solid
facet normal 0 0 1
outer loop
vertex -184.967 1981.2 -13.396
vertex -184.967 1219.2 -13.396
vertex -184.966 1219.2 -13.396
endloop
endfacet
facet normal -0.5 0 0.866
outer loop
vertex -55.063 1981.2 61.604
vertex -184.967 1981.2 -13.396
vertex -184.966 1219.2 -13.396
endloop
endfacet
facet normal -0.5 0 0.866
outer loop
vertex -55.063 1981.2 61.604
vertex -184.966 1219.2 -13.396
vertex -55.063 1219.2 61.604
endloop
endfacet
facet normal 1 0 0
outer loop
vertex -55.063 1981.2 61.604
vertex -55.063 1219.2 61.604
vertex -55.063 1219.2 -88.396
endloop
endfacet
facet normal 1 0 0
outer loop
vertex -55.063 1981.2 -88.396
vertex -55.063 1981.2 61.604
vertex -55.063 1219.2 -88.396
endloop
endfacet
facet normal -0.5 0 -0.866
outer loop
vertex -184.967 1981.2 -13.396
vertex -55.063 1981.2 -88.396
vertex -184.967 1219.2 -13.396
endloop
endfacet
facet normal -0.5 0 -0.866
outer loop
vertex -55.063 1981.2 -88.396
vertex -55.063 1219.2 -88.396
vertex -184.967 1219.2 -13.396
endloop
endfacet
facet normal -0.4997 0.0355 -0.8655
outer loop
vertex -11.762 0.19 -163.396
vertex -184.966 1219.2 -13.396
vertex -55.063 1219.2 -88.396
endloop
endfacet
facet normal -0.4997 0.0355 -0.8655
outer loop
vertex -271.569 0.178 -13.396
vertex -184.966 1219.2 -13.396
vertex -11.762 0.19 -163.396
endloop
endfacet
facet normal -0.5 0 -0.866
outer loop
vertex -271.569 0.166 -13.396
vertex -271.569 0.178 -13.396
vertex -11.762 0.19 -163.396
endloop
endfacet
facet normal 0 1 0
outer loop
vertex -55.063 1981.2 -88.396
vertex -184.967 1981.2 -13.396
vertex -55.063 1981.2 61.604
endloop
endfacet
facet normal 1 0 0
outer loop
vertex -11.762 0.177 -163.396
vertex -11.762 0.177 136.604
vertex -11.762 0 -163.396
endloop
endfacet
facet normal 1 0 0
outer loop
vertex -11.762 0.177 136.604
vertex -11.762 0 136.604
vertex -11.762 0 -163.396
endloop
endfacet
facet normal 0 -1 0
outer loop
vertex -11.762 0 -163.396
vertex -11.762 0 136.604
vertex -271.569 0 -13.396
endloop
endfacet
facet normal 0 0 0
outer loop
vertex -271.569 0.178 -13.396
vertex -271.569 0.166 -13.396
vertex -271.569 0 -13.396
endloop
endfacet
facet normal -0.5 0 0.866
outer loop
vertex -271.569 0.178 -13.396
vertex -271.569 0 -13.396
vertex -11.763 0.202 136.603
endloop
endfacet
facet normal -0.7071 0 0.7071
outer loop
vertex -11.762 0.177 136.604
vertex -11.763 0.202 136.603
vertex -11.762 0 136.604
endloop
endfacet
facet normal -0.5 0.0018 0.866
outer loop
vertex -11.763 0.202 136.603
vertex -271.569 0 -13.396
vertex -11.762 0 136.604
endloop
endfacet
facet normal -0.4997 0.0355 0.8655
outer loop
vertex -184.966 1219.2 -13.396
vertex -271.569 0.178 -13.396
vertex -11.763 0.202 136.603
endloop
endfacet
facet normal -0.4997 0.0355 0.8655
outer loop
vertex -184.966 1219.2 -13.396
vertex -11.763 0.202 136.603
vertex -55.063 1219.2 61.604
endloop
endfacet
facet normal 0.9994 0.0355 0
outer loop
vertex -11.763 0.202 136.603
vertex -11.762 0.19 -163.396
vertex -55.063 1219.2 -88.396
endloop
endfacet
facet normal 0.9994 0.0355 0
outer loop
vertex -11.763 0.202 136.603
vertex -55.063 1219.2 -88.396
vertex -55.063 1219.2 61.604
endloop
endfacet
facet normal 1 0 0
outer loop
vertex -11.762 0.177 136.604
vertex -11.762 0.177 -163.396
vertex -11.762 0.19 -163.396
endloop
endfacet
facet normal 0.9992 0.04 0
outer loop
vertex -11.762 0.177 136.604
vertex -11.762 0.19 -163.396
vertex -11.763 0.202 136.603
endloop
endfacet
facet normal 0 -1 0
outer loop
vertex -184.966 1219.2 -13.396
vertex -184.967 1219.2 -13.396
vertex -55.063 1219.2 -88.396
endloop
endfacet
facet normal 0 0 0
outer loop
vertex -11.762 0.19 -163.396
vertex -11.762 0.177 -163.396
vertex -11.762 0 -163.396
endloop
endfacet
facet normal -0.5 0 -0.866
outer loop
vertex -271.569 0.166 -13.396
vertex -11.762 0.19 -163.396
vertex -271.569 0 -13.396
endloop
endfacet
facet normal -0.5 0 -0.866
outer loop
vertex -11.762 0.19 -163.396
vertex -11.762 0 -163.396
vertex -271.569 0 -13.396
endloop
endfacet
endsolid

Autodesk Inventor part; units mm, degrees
sketch "Sketch1" plane through (0, 0, 0) normal (0, 1, 0) x (-1, 0, 0)
  line L0 (11.7617, 136.6037) -> (11.7617, -163.3963)
  line L1 (11.7617, -163.3963) -> (271.5693, -13.3963)
  line L2 (271.5693, -13.3963) -> (11.7617, 136.6037)
  circle A0 centre (98.3643, -13.3963) radius 86.6025
  line L3 (55.063, 61.6037) -> (55.063, -88.3963)
  line L4 (55.063, 61.6037) -> (184.9668, -13.3963)
  line L5 (55.063, 61.6037) -> (205.063, 61.6037) construction
  line L6 (184.9668, -13.3963) -> (55.063, -88.3963)
  circle A1 centre (98.3643, -13.3963) radius 43.3013
  point P0 (85.0813, -150)
  point P1 (141.6655, 61.6037)
  point P2 (141.6655, -88.3963)
  point P3 (11.7617, -13.3963)
  point P4 (203.5969, -52.6402)
  dimension "d10" = 300
  dimension "d11" = 300
  dimension "d12" = 60
  dimension "d13" = 150
  dimension "d14" = 150
  dimension "d15" = 30
ref_plane "Work Plane1" through (-52.1275, 0, 74.1452) normal (0, -1, 0) x (0, 0, -1)
extrude "Extrusion2" add sketch "Sketch1" along normal blind 1219.2
sketch "Sketch2" plane through (0, 1219.2, 0) normal (0, 1, 0) x (1, 0, 0)
  line L0 (-271.5693, 13.3963) -> (-11.7617, -136.6037) projected
  line L1 (-11.7617, -136.6037) -> (-11.7617, 163.3963) projected
  line L2 (-11.7617, 163.3963) -> (-271.5693, 13.3963) projected
  circle A0 centre (-98.3643, 13.3963) radius 86.6025
  line L3 (-55.063, -61.6037) -> (-55.063, 88.3963)
  line L4 (-55.063, 88.3963) -> (-184.9668, 13.3963)
  line L5 (-184.9668, 13.3963) -> (-55.063, -61.6037)
  circle A1 centre (-98.3643, 13.3963) radius 43.3013
  point P0 (0, 0)
  point P1 (-141.6655, -61.6037)
  point P2 (-11.7617, 13.3963)
  point P3 (-141.6655, 88.3963)
  dimension "d18" = 150
  dimension "d19" = 150
ref_plane "Work Plane2" through (-55.063, 1219.2, 61.6037) normal (-0.9994, -0.0355, 0) x (0, 0, -1)
split "Split1" plane through (-55.063, 1219.2, 61.6037) removes the side toward (0.9994, 0.0355, 0)
ref_plane "Work Plane3" through (-184.9668, 1219.2, -13.3963) normal (0.4997, -0.0355, -0.8655) x (0.866, 0, 0.5)
split "Split2" plane through (-184.9668, 1219.2, -13.3963) removes the side toward (-0.4997, 0.0355, 0.8655)
ref_plane "Work Plane4" through (-55.063, 1219.2, -88.3963) normal (0.4997, -0.0355, 0.8655) x (-0.866, 0, 0.5)
split "Split3" plane through (-55.063, 1219.2, -88.3963) removes the side toward (-0.4997, 0.0355, -0.8655)
extrude "Extrusion3" add sketch "Sketch2" along normal blind 762 contours L4 A1 L5 | L5 A1 L3 | L3 A1 L4 | A1
properties part number "pillar"
